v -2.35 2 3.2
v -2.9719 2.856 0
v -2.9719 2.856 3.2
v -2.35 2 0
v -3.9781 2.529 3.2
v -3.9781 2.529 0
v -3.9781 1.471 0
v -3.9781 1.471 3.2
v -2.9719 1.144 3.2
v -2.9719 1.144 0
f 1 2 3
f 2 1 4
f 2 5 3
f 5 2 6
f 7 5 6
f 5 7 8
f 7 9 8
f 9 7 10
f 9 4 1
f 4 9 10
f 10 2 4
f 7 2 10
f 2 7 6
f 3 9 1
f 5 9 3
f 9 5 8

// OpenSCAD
union() {
  translate([-3.25, 2.0, 0.0]) cylinder(r=0.9, h=3.2);
}
